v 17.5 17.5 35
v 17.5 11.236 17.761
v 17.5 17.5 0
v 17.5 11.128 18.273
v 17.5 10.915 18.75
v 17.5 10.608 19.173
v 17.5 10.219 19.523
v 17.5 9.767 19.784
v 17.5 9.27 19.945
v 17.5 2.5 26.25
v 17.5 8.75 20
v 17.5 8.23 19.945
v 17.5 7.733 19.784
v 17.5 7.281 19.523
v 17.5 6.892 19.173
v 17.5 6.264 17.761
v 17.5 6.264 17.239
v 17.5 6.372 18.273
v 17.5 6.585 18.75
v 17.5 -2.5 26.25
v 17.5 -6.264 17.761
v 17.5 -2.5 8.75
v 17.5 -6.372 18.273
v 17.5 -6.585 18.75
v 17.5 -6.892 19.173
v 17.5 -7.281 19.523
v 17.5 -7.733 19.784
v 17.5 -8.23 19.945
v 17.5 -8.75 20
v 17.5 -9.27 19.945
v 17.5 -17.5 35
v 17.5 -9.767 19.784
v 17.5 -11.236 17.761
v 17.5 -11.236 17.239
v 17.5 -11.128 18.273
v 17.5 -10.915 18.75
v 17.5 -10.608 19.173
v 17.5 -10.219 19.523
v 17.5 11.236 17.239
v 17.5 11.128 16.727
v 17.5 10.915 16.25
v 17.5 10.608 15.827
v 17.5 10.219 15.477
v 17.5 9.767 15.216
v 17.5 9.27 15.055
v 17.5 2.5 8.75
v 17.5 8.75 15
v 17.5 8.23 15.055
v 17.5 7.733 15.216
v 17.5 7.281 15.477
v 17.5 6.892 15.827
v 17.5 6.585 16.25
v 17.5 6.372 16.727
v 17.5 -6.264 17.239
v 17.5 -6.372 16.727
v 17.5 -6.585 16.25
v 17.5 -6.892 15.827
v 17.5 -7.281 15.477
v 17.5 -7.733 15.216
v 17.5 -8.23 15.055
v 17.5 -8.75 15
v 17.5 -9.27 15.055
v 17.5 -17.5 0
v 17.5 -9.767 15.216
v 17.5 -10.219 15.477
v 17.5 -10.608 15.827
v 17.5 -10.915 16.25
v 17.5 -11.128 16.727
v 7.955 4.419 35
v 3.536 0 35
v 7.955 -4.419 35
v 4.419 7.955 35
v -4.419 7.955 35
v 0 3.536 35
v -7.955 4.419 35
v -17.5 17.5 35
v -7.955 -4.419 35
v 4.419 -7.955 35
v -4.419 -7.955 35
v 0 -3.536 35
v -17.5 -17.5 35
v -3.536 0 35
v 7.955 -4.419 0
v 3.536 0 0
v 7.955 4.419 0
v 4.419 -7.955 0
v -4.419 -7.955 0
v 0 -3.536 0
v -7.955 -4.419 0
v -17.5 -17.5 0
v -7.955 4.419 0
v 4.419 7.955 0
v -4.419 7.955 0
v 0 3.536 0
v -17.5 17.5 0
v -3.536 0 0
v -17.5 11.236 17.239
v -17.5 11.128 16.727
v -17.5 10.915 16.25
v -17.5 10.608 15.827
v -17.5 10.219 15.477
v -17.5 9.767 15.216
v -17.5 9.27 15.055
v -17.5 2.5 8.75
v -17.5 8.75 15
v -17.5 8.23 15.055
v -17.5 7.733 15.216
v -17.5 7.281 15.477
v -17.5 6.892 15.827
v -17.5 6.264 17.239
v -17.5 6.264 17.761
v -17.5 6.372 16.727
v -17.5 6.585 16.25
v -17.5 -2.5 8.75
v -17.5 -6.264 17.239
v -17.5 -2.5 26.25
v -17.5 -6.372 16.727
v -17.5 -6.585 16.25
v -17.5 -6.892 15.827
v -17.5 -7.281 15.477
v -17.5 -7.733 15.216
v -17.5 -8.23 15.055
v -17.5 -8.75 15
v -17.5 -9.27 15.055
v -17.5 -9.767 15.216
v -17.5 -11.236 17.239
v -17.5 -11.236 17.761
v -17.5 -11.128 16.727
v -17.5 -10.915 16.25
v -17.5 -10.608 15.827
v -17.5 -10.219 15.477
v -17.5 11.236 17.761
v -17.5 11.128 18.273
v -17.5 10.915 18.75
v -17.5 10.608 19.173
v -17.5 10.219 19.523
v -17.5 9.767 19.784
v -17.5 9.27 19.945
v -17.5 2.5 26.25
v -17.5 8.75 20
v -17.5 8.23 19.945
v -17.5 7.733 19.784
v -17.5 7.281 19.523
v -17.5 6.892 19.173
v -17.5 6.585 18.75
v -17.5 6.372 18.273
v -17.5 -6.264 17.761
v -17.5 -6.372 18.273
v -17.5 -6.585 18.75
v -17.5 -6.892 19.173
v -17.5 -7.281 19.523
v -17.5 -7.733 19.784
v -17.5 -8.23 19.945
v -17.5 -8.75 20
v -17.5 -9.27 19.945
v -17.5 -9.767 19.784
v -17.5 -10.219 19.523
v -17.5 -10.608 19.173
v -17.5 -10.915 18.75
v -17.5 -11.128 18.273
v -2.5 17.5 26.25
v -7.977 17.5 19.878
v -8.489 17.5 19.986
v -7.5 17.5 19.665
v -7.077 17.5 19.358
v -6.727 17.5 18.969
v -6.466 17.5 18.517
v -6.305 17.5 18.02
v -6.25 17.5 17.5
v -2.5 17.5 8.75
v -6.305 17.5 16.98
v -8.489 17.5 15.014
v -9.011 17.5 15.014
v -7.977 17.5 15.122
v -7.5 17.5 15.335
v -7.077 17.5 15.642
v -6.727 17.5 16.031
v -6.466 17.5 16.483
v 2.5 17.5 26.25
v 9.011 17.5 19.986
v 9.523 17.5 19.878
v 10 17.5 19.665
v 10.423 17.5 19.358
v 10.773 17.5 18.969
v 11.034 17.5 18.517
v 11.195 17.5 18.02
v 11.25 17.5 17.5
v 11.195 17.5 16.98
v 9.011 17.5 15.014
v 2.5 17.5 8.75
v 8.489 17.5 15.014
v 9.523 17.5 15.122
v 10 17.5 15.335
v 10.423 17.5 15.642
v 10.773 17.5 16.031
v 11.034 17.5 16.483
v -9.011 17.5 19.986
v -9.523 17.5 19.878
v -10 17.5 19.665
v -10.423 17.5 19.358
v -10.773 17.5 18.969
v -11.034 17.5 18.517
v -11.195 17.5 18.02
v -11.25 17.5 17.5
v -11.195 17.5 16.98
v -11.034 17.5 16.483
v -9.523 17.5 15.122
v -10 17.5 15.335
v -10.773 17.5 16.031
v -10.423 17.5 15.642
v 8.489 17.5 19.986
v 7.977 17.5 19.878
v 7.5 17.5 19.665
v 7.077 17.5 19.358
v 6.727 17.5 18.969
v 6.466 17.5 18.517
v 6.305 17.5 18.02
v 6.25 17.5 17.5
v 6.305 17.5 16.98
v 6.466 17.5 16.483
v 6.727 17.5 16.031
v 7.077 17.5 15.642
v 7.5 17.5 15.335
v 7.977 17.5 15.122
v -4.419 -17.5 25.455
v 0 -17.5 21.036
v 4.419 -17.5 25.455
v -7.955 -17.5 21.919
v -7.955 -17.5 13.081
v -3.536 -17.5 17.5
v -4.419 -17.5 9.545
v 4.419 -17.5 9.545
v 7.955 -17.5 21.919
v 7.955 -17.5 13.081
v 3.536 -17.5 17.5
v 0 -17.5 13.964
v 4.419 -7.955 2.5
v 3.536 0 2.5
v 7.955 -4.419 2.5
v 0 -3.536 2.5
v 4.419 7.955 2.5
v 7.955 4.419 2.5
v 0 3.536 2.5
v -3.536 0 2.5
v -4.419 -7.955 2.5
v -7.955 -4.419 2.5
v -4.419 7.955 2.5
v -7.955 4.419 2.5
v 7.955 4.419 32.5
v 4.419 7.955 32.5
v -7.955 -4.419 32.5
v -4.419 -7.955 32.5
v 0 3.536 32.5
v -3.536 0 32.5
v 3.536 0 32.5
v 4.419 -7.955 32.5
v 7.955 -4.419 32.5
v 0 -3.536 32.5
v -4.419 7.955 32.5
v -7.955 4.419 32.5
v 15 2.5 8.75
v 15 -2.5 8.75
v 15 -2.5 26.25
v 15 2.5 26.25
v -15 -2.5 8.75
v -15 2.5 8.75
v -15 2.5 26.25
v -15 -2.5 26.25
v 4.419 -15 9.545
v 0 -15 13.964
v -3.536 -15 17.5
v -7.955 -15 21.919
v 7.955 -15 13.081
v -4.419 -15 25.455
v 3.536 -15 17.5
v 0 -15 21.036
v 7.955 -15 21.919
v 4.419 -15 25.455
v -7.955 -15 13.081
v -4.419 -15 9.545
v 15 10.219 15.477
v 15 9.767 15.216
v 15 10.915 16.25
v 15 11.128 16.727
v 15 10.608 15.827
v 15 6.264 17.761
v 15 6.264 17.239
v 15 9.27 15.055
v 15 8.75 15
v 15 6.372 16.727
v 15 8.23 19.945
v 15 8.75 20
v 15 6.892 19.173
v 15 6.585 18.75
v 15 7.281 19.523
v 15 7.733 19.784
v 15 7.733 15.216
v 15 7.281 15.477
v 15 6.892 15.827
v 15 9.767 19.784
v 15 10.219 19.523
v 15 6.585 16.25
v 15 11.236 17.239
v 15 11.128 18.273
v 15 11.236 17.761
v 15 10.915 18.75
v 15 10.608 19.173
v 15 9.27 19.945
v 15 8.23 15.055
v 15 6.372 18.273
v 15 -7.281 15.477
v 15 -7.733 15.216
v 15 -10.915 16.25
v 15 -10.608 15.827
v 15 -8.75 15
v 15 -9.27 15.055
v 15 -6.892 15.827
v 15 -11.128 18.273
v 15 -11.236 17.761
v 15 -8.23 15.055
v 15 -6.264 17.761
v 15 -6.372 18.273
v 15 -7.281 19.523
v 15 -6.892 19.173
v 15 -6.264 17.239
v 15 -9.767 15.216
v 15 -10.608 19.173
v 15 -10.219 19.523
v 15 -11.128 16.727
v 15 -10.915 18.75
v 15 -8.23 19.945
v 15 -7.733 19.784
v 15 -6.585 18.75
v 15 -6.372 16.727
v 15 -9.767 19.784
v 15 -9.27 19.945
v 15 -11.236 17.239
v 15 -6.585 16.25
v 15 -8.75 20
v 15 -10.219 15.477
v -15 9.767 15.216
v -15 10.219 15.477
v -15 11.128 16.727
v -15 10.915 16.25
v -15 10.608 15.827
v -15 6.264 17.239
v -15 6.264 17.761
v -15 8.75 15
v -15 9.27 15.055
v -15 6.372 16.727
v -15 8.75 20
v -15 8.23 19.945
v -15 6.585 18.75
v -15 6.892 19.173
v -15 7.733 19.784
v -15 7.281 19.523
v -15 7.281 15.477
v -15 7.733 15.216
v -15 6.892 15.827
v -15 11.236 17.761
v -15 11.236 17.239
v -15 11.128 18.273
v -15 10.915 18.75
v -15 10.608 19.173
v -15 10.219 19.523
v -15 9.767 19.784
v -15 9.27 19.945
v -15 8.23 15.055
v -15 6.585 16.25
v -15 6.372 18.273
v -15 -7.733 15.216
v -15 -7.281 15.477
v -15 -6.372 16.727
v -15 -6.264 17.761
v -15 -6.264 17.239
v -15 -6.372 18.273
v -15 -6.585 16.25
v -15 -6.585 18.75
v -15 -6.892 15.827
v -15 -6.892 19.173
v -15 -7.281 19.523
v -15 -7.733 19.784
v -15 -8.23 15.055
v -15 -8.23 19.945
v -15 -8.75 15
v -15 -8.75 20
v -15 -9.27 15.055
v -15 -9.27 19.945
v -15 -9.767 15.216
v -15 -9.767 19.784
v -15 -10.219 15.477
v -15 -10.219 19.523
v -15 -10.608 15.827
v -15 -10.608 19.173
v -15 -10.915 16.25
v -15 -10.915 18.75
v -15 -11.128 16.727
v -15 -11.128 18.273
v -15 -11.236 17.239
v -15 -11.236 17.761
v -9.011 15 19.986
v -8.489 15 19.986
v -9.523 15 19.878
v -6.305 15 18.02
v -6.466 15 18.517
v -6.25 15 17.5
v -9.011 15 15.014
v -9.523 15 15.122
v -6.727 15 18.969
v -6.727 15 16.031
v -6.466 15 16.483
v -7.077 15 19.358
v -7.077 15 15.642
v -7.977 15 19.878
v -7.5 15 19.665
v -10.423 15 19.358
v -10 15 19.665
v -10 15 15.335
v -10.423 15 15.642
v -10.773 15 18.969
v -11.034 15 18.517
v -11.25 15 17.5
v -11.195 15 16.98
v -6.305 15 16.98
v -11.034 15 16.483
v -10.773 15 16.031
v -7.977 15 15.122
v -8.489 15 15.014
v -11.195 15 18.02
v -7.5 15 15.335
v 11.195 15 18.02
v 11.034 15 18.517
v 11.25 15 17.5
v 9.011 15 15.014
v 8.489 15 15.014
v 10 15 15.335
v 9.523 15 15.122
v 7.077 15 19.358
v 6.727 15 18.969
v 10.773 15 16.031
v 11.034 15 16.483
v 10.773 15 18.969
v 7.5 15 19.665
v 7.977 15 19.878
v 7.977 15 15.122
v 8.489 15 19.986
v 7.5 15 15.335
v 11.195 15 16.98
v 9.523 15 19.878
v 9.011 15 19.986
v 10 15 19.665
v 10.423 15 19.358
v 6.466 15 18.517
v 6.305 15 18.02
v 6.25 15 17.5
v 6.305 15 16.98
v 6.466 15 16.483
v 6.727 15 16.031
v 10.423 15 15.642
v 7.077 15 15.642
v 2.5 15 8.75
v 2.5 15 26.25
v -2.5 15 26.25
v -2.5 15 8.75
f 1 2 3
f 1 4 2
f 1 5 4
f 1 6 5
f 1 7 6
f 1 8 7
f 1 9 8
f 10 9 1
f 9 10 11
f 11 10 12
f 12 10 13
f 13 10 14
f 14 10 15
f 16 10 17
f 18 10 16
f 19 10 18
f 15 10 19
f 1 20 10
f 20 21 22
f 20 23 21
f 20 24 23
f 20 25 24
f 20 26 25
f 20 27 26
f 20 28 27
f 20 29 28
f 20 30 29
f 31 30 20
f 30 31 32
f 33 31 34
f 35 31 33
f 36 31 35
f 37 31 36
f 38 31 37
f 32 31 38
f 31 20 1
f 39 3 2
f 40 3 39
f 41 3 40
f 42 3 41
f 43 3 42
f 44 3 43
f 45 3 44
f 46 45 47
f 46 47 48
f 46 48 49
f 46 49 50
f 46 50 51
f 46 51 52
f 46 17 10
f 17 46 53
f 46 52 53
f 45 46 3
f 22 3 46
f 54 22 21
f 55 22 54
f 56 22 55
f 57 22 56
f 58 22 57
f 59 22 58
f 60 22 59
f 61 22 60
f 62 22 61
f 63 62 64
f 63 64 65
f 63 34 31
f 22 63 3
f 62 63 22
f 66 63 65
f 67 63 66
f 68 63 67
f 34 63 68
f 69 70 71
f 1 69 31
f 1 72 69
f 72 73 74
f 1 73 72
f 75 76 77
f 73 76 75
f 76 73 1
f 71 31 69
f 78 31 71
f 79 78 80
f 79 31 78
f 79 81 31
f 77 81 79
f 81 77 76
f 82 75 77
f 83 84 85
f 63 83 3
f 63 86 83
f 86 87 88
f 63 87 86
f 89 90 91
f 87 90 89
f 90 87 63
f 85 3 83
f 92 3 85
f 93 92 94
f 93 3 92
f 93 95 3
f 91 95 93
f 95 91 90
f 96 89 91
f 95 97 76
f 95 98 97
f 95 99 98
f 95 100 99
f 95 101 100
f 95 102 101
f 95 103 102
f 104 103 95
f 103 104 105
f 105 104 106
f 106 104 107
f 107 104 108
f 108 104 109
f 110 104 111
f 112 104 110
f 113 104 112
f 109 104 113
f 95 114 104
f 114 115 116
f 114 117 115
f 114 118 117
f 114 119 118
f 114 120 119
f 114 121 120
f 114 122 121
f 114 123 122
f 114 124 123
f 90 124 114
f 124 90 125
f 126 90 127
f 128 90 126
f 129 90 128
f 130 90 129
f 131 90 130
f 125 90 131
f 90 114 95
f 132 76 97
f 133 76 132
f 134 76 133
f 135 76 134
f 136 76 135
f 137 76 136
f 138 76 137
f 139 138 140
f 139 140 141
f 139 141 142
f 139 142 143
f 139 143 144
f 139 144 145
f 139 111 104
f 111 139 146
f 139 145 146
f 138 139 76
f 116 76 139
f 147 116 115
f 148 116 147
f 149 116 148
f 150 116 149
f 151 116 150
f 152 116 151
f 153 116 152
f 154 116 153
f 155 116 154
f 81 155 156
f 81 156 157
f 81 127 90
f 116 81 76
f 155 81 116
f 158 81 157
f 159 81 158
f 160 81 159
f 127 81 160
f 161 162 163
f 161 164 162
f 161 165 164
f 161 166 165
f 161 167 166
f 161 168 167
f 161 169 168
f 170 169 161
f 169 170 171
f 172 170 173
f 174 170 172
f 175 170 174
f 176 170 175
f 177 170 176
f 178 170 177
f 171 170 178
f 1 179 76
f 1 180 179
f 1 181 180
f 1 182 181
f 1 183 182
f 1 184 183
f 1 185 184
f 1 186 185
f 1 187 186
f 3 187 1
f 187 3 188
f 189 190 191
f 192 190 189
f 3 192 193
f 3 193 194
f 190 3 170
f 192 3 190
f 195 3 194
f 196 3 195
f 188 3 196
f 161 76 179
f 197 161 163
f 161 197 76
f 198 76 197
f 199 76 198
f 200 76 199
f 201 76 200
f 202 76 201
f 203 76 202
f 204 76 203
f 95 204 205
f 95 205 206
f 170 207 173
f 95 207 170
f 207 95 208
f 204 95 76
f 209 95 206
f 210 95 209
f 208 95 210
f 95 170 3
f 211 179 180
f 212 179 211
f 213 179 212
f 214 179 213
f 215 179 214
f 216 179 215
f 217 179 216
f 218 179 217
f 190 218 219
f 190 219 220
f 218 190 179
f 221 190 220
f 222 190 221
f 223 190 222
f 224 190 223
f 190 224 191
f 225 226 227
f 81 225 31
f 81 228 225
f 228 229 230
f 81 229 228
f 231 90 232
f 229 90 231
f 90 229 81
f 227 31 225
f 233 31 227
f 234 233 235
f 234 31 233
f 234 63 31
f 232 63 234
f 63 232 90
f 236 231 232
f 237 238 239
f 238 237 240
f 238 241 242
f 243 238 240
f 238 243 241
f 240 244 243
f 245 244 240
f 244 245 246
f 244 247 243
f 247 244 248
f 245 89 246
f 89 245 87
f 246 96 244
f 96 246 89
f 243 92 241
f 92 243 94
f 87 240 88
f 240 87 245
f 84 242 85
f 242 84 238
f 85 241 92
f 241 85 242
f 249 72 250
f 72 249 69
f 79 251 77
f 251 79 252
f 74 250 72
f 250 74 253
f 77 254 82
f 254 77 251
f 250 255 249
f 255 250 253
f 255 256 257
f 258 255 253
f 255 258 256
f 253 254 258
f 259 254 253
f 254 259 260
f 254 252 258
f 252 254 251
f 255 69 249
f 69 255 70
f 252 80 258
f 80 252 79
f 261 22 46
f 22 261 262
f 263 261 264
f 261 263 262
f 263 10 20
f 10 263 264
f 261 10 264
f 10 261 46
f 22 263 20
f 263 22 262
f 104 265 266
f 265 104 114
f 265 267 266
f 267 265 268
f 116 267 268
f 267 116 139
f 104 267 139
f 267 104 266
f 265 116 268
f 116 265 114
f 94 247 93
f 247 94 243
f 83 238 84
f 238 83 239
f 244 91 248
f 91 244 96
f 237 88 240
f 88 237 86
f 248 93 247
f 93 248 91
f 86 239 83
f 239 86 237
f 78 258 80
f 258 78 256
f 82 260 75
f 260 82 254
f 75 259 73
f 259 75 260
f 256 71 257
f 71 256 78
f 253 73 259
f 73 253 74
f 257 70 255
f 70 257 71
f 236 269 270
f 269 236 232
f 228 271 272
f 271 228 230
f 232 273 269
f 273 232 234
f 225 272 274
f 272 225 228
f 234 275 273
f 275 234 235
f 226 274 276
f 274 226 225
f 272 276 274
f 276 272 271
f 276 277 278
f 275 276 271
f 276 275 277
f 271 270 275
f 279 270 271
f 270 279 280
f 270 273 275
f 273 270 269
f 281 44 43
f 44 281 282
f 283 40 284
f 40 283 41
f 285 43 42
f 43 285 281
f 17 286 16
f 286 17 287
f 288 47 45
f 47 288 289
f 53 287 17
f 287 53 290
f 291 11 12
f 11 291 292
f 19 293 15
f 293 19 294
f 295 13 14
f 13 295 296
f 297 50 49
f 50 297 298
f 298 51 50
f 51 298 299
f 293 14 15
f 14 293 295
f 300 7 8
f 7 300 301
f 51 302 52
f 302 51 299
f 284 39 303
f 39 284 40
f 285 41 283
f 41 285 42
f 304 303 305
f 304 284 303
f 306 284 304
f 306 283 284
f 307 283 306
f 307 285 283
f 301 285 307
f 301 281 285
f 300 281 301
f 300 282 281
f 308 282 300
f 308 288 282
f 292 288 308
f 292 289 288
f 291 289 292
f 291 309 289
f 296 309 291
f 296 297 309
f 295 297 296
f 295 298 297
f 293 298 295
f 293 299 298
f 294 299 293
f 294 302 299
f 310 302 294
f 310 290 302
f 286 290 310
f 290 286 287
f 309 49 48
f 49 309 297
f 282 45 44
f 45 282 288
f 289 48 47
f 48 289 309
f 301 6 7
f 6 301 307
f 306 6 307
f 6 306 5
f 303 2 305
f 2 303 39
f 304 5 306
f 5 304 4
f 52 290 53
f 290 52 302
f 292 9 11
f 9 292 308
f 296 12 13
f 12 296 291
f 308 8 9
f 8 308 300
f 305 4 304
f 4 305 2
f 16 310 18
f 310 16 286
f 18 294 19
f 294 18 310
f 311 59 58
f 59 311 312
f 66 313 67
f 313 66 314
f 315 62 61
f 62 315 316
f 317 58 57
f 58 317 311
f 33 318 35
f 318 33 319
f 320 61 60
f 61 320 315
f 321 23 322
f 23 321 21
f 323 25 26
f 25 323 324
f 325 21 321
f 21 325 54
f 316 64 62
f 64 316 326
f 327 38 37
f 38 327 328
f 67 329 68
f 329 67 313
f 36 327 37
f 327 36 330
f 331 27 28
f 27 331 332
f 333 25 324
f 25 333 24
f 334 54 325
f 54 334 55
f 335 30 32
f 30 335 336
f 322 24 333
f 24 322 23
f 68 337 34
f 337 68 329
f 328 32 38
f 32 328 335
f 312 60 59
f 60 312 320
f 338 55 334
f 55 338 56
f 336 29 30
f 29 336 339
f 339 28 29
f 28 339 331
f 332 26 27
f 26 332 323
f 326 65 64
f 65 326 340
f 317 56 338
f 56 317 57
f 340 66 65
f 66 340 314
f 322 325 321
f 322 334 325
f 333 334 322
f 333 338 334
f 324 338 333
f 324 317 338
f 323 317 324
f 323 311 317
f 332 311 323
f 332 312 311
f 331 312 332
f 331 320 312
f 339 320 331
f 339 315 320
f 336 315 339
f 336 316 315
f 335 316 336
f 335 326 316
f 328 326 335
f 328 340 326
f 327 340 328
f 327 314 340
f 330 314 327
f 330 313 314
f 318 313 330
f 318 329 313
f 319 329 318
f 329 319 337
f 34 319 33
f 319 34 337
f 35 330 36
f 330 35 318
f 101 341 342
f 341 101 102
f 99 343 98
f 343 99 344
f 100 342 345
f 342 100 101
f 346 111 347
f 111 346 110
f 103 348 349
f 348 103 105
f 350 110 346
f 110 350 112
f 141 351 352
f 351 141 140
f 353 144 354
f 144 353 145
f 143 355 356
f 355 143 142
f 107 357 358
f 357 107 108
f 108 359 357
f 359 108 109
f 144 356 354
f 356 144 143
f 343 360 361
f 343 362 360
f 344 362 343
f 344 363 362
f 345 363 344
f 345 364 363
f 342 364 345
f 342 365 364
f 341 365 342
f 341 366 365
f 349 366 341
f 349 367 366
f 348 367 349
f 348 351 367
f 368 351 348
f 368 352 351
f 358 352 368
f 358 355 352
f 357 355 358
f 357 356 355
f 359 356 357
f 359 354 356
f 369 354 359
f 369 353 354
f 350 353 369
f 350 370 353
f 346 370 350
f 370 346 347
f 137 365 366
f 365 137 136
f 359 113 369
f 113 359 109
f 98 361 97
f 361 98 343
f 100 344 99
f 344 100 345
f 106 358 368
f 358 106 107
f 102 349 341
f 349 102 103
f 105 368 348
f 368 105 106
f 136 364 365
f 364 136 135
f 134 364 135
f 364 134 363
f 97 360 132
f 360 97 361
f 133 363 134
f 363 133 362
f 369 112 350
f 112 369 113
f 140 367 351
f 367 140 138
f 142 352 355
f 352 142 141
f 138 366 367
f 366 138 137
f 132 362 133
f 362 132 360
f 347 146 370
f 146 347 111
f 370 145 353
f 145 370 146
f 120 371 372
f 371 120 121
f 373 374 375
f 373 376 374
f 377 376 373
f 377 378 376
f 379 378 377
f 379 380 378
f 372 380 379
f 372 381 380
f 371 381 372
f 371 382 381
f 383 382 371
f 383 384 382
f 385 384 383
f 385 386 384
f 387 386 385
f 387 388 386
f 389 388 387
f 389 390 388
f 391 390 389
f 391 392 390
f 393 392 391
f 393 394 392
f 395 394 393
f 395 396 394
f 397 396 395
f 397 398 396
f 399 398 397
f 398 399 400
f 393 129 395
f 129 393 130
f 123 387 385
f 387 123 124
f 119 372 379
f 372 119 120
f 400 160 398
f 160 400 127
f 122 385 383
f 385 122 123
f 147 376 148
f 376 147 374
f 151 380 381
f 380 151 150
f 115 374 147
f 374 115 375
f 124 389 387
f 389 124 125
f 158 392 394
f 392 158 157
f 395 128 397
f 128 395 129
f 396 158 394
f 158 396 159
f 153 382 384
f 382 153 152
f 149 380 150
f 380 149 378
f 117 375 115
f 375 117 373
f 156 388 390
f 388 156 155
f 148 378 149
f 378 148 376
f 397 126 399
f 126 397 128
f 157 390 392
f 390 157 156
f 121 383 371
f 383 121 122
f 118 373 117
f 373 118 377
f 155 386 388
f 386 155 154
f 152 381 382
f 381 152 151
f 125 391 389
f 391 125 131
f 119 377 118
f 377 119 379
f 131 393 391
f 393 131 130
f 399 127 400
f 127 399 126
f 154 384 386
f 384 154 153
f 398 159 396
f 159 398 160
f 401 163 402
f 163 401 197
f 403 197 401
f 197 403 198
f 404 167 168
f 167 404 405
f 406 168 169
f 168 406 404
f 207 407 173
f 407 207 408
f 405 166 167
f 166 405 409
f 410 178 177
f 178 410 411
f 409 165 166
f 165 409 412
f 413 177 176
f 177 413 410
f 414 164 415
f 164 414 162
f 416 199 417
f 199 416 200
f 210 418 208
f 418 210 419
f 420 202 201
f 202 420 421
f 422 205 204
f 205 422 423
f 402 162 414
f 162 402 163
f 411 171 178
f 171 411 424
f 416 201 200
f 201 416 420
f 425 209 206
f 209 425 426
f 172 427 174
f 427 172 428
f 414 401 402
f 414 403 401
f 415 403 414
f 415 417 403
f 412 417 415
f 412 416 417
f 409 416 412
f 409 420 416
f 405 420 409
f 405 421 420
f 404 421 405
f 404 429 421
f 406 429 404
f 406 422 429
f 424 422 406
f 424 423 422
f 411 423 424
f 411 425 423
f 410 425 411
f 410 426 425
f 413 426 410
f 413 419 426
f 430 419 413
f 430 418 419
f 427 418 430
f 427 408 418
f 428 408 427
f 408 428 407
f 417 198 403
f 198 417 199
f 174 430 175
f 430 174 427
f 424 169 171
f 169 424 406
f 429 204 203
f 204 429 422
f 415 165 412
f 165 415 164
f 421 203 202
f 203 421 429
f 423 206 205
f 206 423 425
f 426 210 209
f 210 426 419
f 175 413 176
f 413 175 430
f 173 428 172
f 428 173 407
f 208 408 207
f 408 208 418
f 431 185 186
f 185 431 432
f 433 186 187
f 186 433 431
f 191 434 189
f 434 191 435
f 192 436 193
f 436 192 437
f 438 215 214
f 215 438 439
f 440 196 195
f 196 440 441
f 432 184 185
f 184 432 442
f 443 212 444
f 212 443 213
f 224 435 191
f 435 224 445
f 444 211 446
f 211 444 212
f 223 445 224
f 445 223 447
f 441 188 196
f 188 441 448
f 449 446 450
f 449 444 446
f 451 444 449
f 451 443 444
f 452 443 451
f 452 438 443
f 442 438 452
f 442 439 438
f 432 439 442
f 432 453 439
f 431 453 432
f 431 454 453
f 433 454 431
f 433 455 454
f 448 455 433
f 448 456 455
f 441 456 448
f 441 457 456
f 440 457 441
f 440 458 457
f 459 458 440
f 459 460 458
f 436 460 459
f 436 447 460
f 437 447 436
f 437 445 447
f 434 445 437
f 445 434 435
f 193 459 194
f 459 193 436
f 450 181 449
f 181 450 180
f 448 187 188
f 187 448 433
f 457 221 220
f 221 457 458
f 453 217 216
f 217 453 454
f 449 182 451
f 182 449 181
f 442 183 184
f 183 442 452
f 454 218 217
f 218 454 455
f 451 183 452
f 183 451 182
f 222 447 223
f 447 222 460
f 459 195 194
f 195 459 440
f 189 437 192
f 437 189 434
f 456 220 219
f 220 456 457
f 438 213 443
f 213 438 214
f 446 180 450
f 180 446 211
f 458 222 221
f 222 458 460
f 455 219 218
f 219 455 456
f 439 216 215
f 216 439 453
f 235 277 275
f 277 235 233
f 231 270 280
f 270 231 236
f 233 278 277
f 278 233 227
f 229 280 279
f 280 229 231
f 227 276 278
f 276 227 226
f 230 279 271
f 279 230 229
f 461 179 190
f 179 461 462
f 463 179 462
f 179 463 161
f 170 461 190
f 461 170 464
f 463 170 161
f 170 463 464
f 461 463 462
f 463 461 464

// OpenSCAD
l= 140;
w= 140;
h= 140;
scale([.25,.25,.25])

difference()
{
    
   translate([0,0,h/2])
    cube([l,w,h], center=true);

rotate([0,0,45])
translate([0,0,0])
    cube([l/2,20,20],center=true);
    
 rotate([0,0,45])   
translate([0,0,h])
    cube([l/2,20,20],center=true);
    
rotate([0,90,0])    
translate([-l/2,0,h/2])
    cube([l/2,20,20],center=true);
    
rotate([0,90,0])    
translate([-l/2,0,-h/2])
    cube([l/2,20,20],center=true);
    
        
  rotate([0,0,45])
translate([0,0,0])
    cube([20,w/2,20],center=true);

rotate([0,0,45])    
translate([0,0,h])
    cube([20,w/2,20],center=true);  

   
translate([0,-w/2,h/2])
rotate([0,135,0])  
    cube([20,20,h/2],center=true); 
   
translate([l/2,w/4,h/2])
rotate([0,90,0])  
    cylinder(h=20, r1=10, r2=10,center=true); 
    
translate([l/2,-w/4,h/2])
rotate([0,90,0])  
    cylinder(h=20, r1=10, r2=10,center=true); 
    
translate([-l/2,w/4,h/2])
rotate([0,90,0])  
    cylinder(h=20, r1=10, r2=10,center=true); 
    
translate([-l/2,-w/4,h/2])
rotate([0,90,0])  
    cylinder(h=20, r1=10, r2=10,center=true); 
    
translate([-l/4,w/2,h/2])
rotate([90,0,0])  
    cylinder(h=20, r1=10, r2=10,center=true); 
    
translate([l/4,w/2,h/2])
rotate([90,0,0])  
    cylinder(h=20, r1=10, r2=10,center=true);
 

 translate([0,-70,70])
  rotate([0,45,0])
    cube([20,20,70],center=true); 
    
 translate([0,70,70])
    cube([20,20,70],center=true);  
    

}
